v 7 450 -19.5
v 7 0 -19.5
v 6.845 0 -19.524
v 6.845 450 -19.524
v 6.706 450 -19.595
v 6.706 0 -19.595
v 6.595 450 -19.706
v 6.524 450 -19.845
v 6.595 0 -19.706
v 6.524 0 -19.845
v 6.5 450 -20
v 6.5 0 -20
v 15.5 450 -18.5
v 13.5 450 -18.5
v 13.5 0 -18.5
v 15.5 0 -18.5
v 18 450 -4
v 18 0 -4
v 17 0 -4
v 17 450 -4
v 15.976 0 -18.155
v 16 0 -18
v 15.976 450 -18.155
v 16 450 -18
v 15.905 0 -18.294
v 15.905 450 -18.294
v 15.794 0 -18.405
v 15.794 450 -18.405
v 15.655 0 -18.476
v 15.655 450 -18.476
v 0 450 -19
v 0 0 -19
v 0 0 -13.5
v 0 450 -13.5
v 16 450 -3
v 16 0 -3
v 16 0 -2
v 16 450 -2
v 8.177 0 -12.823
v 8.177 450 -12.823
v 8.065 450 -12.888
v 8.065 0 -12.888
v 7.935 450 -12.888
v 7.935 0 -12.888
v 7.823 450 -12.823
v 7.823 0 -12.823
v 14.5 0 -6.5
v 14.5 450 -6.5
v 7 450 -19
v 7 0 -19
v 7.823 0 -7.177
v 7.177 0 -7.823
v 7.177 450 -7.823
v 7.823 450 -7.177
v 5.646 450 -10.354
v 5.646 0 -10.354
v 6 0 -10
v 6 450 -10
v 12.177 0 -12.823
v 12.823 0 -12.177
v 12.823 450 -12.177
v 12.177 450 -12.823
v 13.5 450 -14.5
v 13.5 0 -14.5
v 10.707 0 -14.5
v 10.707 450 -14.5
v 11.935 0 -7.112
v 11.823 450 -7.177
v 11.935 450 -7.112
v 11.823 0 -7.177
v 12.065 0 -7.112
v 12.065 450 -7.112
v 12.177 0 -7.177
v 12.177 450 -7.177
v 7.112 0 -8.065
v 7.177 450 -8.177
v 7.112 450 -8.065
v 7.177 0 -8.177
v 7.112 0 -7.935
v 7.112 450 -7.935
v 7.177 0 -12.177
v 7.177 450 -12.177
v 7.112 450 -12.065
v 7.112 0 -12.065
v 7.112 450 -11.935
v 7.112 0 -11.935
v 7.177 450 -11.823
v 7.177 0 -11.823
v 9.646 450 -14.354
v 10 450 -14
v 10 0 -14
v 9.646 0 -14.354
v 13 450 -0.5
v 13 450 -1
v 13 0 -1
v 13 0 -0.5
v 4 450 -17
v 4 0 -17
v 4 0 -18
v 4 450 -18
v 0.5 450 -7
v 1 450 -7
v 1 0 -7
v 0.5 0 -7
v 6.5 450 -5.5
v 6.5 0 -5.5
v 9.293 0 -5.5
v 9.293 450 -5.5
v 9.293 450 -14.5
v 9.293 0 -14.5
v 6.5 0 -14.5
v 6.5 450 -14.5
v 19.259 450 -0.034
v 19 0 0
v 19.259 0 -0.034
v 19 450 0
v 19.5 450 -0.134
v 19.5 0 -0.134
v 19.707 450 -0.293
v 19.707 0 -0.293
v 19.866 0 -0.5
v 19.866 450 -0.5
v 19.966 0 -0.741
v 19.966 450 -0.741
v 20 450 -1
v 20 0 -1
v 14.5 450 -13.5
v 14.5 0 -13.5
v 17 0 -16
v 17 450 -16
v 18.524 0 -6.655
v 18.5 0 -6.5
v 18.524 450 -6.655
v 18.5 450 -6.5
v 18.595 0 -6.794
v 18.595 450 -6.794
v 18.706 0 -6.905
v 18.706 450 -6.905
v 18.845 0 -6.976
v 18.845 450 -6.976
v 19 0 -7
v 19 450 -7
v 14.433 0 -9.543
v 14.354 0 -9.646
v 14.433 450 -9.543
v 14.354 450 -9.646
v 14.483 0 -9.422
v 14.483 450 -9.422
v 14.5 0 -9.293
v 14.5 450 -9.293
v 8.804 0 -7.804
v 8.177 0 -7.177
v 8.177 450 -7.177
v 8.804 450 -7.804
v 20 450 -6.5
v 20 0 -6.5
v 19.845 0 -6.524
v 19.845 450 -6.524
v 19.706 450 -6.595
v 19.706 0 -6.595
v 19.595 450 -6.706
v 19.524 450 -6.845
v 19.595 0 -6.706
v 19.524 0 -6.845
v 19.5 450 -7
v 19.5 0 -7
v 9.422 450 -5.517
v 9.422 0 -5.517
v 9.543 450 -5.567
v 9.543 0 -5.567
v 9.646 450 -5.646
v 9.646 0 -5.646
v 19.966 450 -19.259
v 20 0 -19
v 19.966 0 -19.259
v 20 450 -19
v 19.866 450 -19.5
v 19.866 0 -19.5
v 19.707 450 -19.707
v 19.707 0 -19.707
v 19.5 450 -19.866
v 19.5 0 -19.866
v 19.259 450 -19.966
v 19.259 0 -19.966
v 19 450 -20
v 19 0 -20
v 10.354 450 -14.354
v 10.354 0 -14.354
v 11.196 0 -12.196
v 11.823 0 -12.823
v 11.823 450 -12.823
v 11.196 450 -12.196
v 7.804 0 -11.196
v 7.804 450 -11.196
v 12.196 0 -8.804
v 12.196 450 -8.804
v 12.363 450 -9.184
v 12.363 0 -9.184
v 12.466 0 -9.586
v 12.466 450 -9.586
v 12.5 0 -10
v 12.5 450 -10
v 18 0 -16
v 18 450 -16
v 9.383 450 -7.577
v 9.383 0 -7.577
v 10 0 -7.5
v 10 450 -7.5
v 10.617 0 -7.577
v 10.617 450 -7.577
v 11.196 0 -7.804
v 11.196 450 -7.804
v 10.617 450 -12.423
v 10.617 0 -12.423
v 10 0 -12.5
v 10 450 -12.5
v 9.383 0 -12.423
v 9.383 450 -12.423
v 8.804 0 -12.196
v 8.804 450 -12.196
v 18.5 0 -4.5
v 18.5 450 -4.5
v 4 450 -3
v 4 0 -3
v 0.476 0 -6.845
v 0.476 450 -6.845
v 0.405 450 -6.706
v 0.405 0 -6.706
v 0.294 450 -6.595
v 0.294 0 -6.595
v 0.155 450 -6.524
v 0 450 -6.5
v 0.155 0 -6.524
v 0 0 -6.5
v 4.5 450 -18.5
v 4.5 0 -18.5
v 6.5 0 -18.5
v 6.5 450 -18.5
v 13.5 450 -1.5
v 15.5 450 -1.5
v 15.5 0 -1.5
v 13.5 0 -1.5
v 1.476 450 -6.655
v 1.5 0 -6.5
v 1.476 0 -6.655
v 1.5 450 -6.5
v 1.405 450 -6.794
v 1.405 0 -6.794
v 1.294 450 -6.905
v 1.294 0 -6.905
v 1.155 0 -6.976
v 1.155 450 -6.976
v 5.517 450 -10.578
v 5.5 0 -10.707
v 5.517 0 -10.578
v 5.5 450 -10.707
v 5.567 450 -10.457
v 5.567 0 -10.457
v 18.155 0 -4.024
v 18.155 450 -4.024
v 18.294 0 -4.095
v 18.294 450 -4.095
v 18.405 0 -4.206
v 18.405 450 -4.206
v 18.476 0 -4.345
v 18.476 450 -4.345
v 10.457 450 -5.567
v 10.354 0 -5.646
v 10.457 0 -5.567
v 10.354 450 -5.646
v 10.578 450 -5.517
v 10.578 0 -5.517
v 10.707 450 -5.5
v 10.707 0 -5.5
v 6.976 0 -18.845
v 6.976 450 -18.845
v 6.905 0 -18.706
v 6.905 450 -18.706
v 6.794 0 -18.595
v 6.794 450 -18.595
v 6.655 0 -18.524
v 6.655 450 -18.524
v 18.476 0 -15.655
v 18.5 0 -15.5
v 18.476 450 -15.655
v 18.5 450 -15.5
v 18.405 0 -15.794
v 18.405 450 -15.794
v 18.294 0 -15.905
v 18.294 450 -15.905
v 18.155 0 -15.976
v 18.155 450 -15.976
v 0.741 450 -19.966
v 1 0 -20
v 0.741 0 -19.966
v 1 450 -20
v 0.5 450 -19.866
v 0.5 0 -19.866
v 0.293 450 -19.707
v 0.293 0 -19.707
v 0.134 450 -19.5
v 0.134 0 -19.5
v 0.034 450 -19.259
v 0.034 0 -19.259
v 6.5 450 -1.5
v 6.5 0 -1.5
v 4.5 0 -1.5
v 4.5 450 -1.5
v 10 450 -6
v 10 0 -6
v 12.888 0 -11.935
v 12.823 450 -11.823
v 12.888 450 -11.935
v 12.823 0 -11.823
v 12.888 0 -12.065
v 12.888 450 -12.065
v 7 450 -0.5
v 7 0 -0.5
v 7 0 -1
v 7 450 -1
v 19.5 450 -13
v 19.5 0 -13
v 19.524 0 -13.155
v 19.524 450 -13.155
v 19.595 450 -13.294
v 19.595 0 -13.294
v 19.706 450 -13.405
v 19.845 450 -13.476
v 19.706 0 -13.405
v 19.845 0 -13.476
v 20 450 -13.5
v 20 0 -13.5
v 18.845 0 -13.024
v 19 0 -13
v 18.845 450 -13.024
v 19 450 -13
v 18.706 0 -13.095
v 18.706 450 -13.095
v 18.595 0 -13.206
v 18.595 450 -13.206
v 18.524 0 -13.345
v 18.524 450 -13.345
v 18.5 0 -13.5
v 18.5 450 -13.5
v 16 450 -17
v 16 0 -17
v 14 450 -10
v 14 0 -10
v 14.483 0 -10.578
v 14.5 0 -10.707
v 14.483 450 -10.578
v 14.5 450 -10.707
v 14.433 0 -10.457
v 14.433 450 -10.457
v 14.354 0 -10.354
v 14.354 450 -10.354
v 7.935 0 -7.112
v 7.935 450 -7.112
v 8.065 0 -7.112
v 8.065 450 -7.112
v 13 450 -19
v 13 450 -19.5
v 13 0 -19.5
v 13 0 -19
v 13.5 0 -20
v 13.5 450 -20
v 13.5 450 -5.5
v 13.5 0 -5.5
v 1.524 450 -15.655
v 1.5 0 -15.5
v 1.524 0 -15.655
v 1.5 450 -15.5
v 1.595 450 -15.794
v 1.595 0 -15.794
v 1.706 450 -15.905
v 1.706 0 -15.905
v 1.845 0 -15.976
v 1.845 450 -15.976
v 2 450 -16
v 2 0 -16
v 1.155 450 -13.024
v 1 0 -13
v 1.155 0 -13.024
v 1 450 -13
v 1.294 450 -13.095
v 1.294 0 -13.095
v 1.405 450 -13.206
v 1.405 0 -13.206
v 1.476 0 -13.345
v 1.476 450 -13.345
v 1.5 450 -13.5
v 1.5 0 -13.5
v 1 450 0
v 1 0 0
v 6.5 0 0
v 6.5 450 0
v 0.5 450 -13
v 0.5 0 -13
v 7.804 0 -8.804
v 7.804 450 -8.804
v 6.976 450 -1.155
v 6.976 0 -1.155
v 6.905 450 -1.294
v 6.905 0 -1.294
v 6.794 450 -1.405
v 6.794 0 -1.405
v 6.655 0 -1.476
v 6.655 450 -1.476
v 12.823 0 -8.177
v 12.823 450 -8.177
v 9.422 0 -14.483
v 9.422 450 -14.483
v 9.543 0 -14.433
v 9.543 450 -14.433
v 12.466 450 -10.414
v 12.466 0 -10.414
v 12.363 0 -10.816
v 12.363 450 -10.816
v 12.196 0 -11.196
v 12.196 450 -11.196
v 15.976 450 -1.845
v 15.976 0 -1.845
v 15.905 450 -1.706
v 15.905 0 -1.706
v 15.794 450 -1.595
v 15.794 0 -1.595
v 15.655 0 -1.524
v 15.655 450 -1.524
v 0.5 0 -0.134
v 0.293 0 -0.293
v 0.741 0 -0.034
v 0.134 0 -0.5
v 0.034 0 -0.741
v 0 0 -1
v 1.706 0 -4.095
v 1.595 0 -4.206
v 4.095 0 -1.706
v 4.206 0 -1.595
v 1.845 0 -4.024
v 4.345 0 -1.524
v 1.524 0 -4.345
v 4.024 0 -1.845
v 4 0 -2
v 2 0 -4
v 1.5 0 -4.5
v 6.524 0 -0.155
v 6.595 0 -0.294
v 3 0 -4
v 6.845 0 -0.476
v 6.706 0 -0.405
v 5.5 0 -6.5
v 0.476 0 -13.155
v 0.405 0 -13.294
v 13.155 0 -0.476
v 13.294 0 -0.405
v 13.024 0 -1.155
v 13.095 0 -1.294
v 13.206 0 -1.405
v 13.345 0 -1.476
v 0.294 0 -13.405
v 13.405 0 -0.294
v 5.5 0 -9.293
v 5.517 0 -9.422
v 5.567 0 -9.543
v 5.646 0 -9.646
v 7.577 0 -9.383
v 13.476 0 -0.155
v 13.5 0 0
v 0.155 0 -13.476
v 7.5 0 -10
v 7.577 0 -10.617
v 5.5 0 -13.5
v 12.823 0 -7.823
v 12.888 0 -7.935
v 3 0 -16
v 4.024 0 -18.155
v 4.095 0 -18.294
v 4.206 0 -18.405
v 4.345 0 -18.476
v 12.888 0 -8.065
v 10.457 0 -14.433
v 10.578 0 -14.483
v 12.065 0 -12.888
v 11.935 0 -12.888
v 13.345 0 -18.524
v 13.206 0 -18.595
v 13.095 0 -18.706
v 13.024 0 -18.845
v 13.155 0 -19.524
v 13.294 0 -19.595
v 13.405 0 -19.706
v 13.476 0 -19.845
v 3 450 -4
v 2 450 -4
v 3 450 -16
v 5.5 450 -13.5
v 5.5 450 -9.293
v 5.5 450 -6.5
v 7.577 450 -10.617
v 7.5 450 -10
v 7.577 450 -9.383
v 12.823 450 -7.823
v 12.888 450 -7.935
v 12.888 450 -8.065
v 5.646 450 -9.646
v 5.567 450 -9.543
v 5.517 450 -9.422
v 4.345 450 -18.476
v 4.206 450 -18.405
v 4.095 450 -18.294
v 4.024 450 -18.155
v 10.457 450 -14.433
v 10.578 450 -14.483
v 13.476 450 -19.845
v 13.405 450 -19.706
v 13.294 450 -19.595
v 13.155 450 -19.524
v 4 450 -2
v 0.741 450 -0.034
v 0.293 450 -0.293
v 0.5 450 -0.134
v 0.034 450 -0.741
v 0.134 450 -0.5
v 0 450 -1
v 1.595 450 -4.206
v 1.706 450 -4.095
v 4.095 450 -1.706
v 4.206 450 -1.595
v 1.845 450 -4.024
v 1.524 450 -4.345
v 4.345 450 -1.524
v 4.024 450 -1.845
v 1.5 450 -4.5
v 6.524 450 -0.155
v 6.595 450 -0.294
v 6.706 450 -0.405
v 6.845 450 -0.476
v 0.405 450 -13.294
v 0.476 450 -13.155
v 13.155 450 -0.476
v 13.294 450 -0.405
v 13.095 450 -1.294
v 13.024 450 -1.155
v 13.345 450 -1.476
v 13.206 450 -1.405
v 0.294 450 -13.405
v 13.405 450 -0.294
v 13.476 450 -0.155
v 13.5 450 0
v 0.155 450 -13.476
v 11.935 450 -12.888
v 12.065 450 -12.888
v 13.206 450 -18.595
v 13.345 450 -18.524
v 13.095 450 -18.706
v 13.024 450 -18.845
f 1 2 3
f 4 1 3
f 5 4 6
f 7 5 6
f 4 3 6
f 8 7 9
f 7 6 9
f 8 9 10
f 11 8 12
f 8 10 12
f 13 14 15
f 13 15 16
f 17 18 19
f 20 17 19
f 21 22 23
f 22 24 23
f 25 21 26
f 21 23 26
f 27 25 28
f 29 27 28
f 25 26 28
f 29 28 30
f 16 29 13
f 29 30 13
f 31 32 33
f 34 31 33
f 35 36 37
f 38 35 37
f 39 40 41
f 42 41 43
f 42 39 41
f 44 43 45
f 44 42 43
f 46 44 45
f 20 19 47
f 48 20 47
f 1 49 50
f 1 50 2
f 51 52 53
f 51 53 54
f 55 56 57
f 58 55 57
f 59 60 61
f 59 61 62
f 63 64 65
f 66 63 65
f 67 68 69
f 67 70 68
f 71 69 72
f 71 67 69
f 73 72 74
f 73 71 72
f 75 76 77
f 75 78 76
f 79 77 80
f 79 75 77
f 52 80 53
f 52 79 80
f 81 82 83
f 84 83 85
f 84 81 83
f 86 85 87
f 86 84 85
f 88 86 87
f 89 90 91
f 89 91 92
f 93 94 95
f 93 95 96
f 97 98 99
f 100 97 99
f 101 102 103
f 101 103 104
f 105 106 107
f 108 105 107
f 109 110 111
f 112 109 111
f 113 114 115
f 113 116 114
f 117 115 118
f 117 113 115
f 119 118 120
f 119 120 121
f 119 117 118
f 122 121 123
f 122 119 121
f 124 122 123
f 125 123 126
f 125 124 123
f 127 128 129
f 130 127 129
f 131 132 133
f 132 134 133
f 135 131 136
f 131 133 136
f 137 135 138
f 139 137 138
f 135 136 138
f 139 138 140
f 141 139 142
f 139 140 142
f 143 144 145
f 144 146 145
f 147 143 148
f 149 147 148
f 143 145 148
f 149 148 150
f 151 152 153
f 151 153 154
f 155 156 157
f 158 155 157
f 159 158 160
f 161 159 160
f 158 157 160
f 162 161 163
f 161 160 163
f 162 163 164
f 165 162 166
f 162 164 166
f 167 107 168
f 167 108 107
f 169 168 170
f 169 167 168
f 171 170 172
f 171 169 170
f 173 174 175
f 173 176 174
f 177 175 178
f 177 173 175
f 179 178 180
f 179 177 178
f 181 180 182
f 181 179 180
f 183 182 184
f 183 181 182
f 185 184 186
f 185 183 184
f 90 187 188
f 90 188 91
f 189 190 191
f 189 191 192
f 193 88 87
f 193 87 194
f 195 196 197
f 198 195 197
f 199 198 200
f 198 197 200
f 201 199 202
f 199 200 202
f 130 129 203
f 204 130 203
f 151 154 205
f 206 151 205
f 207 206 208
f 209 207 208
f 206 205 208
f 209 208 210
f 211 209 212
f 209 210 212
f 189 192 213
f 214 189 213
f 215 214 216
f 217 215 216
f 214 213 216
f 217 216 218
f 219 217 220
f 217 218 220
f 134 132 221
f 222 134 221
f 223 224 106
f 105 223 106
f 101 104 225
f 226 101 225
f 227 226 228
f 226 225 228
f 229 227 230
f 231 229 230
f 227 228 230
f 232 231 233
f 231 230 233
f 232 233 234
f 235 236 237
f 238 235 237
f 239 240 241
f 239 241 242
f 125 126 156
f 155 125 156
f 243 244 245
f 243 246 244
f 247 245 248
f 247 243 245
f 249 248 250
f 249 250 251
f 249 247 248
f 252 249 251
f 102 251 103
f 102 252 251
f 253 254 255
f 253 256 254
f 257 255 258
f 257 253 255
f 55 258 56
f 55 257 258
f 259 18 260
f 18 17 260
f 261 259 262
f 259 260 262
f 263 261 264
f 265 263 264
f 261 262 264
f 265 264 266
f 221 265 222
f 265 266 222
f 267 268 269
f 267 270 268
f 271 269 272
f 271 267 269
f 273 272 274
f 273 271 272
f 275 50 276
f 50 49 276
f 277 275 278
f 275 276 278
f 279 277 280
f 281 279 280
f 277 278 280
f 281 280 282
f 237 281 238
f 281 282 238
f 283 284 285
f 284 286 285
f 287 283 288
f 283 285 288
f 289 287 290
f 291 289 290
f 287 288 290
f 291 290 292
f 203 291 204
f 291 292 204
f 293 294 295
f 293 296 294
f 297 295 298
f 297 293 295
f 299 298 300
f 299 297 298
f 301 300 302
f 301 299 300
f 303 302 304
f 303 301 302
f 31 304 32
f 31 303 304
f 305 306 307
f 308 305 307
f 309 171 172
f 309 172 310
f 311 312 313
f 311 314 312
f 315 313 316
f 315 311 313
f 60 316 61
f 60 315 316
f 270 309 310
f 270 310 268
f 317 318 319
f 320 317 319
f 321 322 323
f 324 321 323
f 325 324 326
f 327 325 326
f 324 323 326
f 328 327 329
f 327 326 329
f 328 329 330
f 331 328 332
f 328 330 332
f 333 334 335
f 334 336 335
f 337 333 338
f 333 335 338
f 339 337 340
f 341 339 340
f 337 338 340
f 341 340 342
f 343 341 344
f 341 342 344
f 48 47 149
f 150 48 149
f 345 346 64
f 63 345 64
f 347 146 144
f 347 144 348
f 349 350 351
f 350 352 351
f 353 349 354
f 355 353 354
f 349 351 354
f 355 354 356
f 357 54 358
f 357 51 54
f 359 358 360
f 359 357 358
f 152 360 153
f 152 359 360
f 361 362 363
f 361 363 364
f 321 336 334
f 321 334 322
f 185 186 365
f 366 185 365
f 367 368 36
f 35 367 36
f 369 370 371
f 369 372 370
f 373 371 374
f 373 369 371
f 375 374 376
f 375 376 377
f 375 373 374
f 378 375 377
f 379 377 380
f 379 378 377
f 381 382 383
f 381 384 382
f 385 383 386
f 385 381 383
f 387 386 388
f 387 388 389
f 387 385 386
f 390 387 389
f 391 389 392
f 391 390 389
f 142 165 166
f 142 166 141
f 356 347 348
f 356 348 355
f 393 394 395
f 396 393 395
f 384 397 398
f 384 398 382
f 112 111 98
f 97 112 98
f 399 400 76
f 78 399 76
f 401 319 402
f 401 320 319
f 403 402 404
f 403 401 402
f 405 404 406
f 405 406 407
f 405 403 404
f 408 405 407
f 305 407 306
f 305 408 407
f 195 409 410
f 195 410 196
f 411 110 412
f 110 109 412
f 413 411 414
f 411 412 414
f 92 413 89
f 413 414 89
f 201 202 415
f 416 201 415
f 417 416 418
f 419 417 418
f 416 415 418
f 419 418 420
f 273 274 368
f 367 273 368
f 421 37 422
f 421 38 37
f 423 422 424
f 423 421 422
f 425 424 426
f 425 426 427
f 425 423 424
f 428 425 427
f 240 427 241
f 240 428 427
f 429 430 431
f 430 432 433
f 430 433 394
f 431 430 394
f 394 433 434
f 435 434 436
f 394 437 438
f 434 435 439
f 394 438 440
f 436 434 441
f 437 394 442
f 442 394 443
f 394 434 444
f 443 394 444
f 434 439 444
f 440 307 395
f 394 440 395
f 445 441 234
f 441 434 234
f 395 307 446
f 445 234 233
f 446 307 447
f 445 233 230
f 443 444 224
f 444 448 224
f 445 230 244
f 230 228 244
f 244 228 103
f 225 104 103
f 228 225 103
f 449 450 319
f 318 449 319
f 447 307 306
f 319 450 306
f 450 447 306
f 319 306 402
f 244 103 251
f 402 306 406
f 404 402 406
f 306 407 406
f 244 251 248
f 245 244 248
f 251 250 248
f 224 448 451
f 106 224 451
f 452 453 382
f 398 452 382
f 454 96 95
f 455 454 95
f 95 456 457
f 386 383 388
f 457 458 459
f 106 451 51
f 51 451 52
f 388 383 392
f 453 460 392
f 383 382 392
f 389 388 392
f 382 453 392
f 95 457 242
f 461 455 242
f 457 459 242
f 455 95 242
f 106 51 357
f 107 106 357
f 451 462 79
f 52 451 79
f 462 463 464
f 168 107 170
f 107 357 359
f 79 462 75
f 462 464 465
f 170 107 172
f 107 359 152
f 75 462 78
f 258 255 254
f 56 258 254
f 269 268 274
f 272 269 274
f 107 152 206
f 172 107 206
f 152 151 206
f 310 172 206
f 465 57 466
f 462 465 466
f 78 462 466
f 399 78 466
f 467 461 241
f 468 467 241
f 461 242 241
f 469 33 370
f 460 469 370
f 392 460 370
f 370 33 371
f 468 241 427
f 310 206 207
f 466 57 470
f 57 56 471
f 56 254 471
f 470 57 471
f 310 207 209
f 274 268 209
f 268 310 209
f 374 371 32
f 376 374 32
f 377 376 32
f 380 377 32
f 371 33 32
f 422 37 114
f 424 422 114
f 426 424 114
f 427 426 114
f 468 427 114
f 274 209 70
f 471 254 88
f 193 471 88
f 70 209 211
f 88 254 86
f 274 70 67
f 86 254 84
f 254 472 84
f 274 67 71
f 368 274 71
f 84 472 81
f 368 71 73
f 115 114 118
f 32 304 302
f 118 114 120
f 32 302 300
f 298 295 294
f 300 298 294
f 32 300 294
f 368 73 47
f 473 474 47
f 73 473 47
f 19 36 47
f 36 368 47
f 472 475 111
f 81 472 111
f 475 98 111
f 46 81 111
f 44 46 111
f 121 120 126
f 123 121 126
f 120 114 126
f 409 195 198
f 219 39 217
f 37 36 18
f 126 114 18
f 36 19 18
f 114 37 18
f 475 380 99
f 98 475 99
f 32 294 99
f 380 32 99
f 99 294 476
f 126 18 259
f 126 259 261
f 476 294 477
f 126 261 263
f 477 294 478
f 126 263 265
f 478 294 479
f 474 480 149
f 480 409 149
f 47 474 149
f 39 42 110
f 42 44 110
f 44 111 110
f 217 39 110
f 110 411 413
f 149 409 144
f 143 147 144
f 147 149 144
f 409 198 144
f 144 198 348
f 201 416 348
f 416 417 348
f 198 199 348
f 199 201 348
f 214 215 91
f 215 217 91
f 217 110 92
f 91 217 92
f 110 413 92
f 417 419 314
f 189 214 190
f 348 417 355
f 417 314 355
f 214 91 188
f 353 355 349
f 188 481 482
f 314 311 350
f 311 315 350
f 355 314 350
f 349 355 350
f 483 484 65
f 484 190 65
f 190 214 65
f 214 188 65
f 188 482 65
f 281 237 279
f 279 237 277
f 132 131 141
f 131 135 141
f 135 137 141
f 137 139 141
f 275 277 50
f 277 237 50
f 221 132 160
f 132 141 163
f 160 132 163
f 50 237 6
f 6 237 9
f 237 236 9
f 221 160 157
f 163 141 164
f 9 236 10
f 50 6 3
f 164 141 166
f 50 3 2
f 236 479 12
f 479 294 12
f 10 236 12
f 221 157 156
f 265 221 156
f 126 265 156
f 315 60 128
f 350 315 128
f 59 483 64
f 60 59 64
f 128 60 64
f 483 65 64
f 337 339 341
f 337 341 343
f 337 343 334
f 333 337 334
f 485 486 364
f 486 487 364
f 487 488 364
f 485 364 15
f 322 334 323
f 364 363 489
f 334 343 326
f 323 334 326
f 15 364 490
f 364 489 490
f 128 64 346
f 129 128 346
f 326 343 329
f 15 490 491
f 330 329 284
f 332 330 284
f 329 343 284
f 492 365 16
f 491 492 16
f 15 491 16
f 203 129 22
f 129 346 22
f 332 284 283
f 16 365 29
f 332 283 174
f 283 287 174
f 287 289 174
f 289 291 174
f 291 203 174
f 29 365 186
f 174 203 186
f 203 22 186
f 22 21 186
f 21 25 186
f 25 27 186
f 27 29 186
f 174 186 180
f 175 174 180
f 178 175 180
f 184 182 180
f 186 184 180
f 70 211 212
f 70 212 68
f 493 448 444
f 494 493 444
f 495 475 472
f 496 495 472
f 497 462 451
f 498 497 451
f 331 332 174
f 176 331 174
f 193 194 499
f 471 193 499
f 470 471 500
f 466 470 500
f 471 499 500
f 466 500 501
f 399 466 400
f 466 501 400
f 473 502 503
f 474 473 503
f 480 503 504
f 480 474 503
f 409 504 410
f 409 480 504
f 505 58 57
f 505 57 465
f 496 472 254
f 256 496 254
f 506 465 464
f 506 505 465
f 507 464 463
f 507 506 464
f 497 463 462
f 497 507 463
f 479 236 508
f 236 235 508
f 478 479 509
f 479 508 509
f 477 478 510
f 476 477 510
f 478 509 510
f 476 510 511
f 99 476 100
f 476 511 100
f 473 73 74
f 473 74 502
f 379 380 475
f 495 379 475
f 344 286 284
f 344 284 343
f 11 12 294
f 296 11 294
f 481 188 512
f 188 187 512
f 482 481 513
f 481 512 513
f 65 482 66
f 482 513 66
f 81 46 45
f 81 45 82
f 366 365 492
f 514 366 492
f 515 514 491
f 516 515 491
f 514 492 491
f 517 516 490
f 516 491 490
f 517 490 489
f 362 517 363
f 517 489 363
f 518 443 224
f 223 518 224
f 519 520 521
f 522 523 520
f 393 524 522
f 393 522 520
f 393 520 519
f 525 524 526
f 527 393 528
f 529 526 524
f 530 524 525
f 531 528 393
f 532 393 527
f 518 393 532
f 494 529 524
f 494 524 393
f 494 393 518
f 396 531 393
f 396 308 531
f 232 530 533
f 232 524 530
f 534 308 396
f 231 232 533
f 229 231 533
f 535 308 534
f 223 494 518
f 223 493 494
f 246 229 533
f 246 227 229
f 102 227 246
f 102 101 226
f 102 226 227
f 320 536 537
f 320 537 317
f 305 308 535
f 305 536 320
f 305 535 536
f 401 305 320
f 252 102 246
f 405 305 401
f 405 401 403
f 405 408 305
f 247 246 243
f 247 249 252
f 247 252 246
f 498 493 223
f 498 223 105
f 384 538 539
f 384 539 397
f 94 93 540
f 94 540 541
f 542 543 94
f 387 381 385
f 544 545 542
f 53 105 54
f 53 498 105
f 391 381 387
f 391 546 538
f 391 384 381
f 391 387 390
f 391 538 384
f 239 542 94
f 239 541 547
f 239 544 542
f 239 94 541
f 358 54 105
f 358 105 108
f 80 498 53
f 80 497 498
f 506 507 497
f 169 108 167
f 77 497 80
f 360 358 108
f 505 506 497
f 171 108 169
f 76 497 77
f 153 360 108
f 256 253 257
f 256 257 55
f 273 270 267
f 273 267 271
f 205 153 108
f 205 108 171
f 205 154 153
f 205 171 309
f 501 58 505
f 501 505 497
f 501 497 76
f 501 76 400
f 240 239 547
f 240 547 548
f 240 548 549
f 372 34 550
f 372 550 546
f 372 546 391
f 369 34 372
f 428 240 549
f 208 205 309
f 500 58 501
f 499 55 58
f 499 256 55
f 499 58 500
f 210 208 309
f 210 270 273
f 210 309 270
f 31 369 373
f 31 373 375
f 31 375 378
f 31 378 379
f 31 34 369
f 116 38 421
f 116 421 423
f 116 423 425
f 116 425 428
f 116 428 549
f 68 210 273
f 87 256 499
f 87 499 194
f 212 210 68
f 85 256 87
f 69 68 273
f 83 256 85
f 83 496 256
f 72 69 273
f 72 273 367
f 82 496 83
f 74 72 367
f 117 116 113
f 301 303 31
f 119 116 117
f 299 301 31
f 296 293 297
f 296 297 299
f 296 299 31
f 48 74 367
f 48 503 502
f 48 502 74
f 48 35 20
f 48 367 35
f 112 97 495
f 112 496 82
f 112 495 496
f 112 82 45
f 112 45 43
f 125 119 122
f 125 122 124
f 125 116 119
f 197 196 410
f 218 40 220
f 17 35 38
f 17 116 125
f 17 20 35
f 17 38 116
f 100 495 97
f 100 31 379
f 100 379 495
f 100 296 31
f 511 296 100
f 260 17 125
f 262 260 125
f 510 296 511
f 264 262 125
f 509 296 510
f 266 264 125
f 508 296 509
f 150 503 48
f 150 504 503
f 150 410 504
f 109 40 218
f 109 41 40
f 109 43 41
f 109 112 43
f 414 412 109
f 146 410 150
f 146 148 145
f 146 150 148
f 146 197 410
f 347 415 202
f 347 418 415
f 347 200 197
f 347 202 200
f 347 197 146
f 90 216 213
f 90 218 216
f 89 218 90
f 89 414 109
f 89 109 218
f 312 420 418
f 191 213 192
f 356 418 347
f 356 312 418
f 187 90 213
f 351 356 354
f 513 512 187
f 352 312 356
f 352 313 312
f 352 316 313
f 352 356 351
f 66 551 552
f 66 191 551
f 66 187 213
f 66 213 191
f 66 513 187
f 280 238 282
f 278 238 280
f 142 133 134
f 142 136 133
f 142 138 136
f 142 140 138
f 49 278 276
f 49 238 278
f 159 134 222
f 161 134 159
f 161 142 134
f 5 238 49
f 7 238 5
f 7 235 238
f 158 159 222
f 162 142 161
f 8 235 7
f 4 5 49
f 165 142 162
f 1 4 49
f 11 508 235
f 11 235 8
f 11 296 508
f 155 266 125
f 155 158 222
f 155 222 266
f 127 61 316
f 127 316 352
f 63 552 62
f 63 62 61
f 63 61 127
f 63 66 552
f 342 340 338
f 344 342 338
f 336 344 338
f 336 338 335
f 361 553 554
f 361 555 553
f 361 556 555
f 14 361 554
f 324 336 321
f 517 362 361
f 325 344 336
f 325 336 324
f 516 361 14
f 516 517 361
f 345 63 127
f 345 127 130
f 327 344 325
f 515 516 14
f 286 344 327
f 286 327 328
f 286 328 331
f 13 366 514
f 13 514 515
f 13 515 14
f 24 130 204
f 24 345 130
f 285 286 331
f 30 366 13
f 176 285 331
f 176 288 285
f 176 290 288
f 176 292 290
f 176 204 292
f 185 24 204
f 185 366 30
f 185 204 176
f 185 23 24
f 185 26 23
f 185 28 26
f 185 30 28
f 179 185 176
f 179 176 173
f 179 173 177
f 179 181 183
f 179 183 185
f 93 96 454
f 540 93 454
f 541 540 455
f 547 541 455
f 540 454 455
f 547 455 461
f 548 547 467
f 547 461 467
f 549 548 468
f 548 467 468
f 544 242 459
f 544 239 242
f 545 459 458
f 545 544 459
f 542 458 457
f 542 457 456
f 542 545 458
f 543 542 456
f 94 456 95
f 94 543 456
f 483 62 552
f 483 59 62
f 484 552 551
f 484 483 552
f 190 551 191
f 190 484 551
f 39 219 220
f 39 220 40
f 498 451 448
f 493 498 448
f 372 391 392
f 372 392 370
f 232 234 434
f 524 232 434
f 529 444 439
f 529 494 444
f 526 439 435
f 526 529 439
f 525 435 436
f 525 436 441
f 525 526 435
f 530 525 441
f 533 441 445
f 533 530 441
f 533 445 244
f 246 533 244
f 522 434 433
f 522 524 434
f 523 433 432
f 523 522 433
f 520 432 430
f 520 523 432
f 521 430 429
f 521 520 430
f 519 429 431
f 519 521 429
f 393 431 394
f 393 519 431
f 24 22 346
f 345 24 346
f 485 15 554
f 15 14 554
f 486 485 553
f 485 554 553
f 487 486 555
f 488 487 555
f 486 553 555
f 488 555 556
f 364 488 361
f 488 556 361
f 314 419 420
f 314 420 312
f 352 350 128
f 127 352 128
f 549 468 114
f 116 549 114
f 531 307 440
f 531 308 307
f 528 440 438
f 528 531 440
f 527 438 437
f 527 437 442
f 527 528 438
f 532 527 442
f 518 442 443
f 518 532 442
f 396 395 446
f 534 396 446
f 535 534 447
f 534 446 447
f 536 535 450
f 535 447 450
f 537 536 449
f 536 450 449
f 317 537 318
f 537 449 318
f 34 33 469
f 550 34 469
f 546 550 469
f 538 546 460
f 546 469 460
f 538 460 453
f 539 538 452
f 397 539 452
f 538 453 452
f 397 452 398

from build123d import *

# Parameters (mm, degrees)
BOSS_EXTRUDE1_DEPTH = 450
FILLET1_R           = 1
CUT_EXTRUDE1_DEPTH  = 451
FILLET2_R           = 0.5
FILLET3_R           = 0.25


with BuildPart() as part:
    # Sketch3 → Boss-Extrude1 (new body)
    with BuildSketch(Plane(origin=(0, 0, 0), x_dir=(1, 0, 0), z_dir=(0, 1, 0))):
        with BuildLine():
            Line((7, 18.5), (7, 19.5))
            ThreePointArc((7, 19.5), (6.646446609, 19.646446609), (6.5, 20))
            Line((6.5, 20), (0, 20))
            Line((0, 20), (0, 13.5))
            ThreePointArc((0, 13.5), (0.353553391, 13.353553391), (0.5, 13))
            Line((0.5, 13), (1.5, 13))
            Line((1.5, 13), (1.5, 16))
            Line((1.5, 16), (3, 16))
            Line((3, 16), (5.5, 13.5))
            Line((5.5, 13.5), (5.5, 10.5))
            Line((5.5, 10.5), (6, 10))
            Line((6, 10), (5.5, 9.5))
            Line((5.5, 9.5), (5.5, 6.5))
            Line((5.5, 6.5), (3, 4))
            Line((3, 4), (1.5, 4))
            Line((1.5, 4), (1.5, 7))
            Line((1.5, 7), (0.5, 7))
            ThreePointArc((0.5, 7), (0.353553391, 6.646446609), (0, 6.5))
            Line((0, 6.5), (0, 0))
            Line((0, 0), (6.5, 0))
            ThreePointArc((6.5, 0), (6.646446609, 0.353553391), (7, 0.5))
            Line((7, 0.5), (7, 1.5))
            Line((7, 1.5), (4, 1.5))
            Line((4, 1.5), (4, 3))
            Line((4, 3), (6.5, 5.5))
            Line((6.5, 5.5), (9.5, 5.5))
            Line((9.5, 5.5), (10, 6))
            Line((10, 6), (10.5, 5.5))
            Line((10.5, 5.5), (13.5, 5.5))
            Line((13.5, 5.5), (16, 3))
            Line((16, 3), (16, 1.5))
            Line((16, 1.5), (13, 1.5))
            Line((13, 1.5), (13, 0.5))
            ThreePointArc((13, 0.5), (13.353553391, 0.353553391), (13.5, 0))
            Line((13.5, 0), (20, 0))
            Line((20, 0), (20, 6.5))
            ThreePointArc((20, 6.5), (19.646446609, 6.646446609), (19.5, 7))
            Line((19.5, 7), (18.5, 7))
            Line((18.5, 7), (18.5, 4))
            Line((18.5, 4), (17, 4))
            Line((17, 4), (14.5, 6.5))
            Line((14.5, 6.5), (14.5, 9.5))
            Line((14.5, 9.5), (14, 10))
            Line((14, 10), (14.5, 10.5))
            Line((14.5, 10.5), (14.5, 13.5))
            Line((14.5, 13.5), (17, 16))
            Line((17, 16), (18.5, 16))
            Line((18.5, 16), (18.5, 13))
            Line((18.5, 13), (19.5, 13))
            ThreePointArc((19.5, 13), (19.646446609, 13.353553391), (20, 13.5))
            Line((20, 13.5), (20, 20))
            Line((20, 20), (13.5, 20))
            ThreePointArc((13.5, 20), (13.353553391, 19.646446609), (13, 19.5))
            Line((13, 19.5), (13, 18.5))
            Line((13, 18.5), (16, 18.5))
            Line((16, 18.5), (16, 17))
            Line((16, 17), (13.5, 14.5))
            Line((13.5, 14.5), (10.5, 14.5))
            Line((10.5, 14.5), (10, 14))
            Line((10, 14), (9.5, 14.5))
            Line((9.5, 14.5), (6.5, 14.5))
            Line((6.5, 14.5), (4, 17))
            Line((4, 17), (4, 18.5))
            Line((4, 18.5), (7, 18.5))
        make_face()
    extrude(amount=BOSS_EXTRUDE1_DEPTH)

    # Fillet1
    fillet1_edges = [part.edges().sort_by_distance(p)[0] for p in [
        (20, 225, 0),
        (0, 225, 0),
        (0, 225, -20),
        (20, 225, -20),
    ]]
    fillet(fillet1_edges, radius=FILLET1_R)

    # Sketch4 → Cut-Extrude1 (cut, through all)
    with BuildSketch(Plane(origin=(0, 450, 0), x_dir=(1, 0, 0), z_dir=(0, 1, 0))):
        with BuildLine():
            Line((10, 11), (11.195582496, 12.195582496))
            ThreePointArc((11.195582496, 12.195582496), (10, 12.5), (8.804417504, 12.195582496))
            Line((8.804417504, 12.195582496), (10, 11))
        make_face()
        with BuildLine():
            ThreePointArc((12.195582496, 11.195582496), (11.767766953, 11.767766953), (11.195582496, 12.195582496))
            Line((11.195582496, 12.195582496), (10, 11))
            Line((10, 11), (11, 10))
            Line((11, 10), (12.195582496, 11.195582496))
        make_face()
        with BuildLine():
            Line((9, 10), (10, 11))
            Line((10, 11), (8.804417504, 12.195582496))
            ThreePointArc((8.804417504, 12.195582496), (8.232233047, 11.767766953), (7.804417504, 11.195582496))
            Line((7.804417504, 11.195582496), (9, 10))
        make_face()
        Polygon((11, 10), (10, 11), (9, 10), (10, 9), align=None)
        with BuildLine():
            Line((7.804417504, 8.804417504), (9, 10))
            Line((9, 10), (7.804417504, 11.195582496))
            ThreePointArc((7.804417504, 11.195582496), (7.5, 10), (7.804417504, 8.804417504))
        make_face()
        with BuildLine():
            Line((10, 9), (9, 10))
            Line((9, 10), (7.804417504, 8.804417504))
            ThreePointArc((7.804417504, 8.804417504), (8.232233047, 8.232233047), (8.804417504, 7.804417504))
            Line((8.804417504, 7.804417504), (10, 9))
        make_face()
        with BuildLine():
            Line((11.195582496, 7.804417504), (10, 9))
            Line((10, 9), (8.804417504, 7.804417504))
            ThreePointArc((8.804417504, 7.804417504), (10, 7.5), (11.195582496, 7.804417504))
        make_face()
        with BuildLine():
            Line((12.195582496, 8.804417504), (11, 10))
            Line((11, 10), (10, 9))
            Line((10, 9), (11.195582496, 7.804417504))
            ThreePointArc((11.195582496, 7.804417504), (11.767766953, 8.232233047), (12.195582496, 8.804417504))
        make_face()
        with BuildLine():
            ThreePointArc((12.5, 10), (12.422700584, 10.616864556), (12.195582496, 11.195582496))
            Line((12.195582496, 11.195582496), (11, 10))
            Line((11, 10), (12.195582496, 8.804417504))
            ThreePointArc((12.195582496, 8.804417504), (12.422700584, 9.383135444), (12.5, 10))
        make_face()
        with BuildLine():
            ThreePointArc((8.804417504, 7.804417504), (8.232233047, 8.232233047), (7.804417504, 8.804417504))
            Line((7.804417504, 8.804417504), (7, 8))
            Line((7, 8), (8, 7))
            Line((8, 7), (8.804417504, 7.804417504))
        make_face()
        with BuildLine():
            Line((13, 8), (12.195582496, 8.804417504))
            ThreePointArc((12.195582496, 8.804417504), (11.767766953, 8.232233047), (11.195582496, 7.804417504))
            Line((11.195582496, 7.804417504), (12, 7))
            Line((12, 7), (13, 8))
        make_face()
        with BuildLine():
            Line((13, 12), (12, 13))
            Line((12, 13), (11.195582496, 12.195582496))
            ThreePointArc((11.195582496, 12.195582496), (11.767766953, 11.767766953), (12.195582496, 11.195582496))
            Line((12.195582496, 11.195582496), (13, 12))
        make_face()
        with BuildLine():
            ThreePointArc((7.804417504, 11.195582496), (8.232233047, 11.767766953), (8.804417504, 12.195582496))
            Line((8.804417504, 12.195582496), (8, 13))
            Line((8, 13), (7, 12))
            Line((7, 12), (7.804417504, 11.195582496))
        make_face()
    extrude(amount=-CUT_EXTRUDE1_DEPTH, mode=Mode.SUBTRACT)

    # Fillet2
    fillet2_edges = [part.edges().sort_by_distance(p)[0] for p in [
        (18.5, 225, -13),
        (18.5, 225, -16),
        (14.5, 225, -10.5),
        (14.5, 225, -9.5),
        (18.5, 225, -4),
        (18.5, 225, -7),
        (13, 225, -1.5),
        (16, 225, -1.5),
        (10.5, 225, -5.5),
        (9.5, 225, -5.5),
        (4, 225, -1.5),
        (7, 225, -1.5),
        (1.5, 225, -7),
        (1.5, 225, -4),
        (5.5, 225, -9.5),
        (5.5, 225, -10.5),
        (1.5, 225, -16),
        (1.5, 225, -13),
        (7, 225, -18.5),
        (4, 225, -18.5),
        (9.5, 225, -14.5),
        (10.5, 225, -14.5),
        (16, 225, -18.5),
        (13, 225, -18.5),
    ]]
    fillet(fillet2_edges, radius=FILLET2_R)

    # Fillet3
    fillet3_edges = [part.edges().sort_by_distance(p)[0] for p in [
        (7, 225, -12),
        (8, 225, -13),
        (12, 225, -13),
        (13, 225, -12),
        (13, 225, -8),
        (12, 225, -7),
        (8, 225, -7),
        (7, 225, -8),
    ]]
    fillet(fillet3_edges, radius=FILLET3_R)


solid = part.part
